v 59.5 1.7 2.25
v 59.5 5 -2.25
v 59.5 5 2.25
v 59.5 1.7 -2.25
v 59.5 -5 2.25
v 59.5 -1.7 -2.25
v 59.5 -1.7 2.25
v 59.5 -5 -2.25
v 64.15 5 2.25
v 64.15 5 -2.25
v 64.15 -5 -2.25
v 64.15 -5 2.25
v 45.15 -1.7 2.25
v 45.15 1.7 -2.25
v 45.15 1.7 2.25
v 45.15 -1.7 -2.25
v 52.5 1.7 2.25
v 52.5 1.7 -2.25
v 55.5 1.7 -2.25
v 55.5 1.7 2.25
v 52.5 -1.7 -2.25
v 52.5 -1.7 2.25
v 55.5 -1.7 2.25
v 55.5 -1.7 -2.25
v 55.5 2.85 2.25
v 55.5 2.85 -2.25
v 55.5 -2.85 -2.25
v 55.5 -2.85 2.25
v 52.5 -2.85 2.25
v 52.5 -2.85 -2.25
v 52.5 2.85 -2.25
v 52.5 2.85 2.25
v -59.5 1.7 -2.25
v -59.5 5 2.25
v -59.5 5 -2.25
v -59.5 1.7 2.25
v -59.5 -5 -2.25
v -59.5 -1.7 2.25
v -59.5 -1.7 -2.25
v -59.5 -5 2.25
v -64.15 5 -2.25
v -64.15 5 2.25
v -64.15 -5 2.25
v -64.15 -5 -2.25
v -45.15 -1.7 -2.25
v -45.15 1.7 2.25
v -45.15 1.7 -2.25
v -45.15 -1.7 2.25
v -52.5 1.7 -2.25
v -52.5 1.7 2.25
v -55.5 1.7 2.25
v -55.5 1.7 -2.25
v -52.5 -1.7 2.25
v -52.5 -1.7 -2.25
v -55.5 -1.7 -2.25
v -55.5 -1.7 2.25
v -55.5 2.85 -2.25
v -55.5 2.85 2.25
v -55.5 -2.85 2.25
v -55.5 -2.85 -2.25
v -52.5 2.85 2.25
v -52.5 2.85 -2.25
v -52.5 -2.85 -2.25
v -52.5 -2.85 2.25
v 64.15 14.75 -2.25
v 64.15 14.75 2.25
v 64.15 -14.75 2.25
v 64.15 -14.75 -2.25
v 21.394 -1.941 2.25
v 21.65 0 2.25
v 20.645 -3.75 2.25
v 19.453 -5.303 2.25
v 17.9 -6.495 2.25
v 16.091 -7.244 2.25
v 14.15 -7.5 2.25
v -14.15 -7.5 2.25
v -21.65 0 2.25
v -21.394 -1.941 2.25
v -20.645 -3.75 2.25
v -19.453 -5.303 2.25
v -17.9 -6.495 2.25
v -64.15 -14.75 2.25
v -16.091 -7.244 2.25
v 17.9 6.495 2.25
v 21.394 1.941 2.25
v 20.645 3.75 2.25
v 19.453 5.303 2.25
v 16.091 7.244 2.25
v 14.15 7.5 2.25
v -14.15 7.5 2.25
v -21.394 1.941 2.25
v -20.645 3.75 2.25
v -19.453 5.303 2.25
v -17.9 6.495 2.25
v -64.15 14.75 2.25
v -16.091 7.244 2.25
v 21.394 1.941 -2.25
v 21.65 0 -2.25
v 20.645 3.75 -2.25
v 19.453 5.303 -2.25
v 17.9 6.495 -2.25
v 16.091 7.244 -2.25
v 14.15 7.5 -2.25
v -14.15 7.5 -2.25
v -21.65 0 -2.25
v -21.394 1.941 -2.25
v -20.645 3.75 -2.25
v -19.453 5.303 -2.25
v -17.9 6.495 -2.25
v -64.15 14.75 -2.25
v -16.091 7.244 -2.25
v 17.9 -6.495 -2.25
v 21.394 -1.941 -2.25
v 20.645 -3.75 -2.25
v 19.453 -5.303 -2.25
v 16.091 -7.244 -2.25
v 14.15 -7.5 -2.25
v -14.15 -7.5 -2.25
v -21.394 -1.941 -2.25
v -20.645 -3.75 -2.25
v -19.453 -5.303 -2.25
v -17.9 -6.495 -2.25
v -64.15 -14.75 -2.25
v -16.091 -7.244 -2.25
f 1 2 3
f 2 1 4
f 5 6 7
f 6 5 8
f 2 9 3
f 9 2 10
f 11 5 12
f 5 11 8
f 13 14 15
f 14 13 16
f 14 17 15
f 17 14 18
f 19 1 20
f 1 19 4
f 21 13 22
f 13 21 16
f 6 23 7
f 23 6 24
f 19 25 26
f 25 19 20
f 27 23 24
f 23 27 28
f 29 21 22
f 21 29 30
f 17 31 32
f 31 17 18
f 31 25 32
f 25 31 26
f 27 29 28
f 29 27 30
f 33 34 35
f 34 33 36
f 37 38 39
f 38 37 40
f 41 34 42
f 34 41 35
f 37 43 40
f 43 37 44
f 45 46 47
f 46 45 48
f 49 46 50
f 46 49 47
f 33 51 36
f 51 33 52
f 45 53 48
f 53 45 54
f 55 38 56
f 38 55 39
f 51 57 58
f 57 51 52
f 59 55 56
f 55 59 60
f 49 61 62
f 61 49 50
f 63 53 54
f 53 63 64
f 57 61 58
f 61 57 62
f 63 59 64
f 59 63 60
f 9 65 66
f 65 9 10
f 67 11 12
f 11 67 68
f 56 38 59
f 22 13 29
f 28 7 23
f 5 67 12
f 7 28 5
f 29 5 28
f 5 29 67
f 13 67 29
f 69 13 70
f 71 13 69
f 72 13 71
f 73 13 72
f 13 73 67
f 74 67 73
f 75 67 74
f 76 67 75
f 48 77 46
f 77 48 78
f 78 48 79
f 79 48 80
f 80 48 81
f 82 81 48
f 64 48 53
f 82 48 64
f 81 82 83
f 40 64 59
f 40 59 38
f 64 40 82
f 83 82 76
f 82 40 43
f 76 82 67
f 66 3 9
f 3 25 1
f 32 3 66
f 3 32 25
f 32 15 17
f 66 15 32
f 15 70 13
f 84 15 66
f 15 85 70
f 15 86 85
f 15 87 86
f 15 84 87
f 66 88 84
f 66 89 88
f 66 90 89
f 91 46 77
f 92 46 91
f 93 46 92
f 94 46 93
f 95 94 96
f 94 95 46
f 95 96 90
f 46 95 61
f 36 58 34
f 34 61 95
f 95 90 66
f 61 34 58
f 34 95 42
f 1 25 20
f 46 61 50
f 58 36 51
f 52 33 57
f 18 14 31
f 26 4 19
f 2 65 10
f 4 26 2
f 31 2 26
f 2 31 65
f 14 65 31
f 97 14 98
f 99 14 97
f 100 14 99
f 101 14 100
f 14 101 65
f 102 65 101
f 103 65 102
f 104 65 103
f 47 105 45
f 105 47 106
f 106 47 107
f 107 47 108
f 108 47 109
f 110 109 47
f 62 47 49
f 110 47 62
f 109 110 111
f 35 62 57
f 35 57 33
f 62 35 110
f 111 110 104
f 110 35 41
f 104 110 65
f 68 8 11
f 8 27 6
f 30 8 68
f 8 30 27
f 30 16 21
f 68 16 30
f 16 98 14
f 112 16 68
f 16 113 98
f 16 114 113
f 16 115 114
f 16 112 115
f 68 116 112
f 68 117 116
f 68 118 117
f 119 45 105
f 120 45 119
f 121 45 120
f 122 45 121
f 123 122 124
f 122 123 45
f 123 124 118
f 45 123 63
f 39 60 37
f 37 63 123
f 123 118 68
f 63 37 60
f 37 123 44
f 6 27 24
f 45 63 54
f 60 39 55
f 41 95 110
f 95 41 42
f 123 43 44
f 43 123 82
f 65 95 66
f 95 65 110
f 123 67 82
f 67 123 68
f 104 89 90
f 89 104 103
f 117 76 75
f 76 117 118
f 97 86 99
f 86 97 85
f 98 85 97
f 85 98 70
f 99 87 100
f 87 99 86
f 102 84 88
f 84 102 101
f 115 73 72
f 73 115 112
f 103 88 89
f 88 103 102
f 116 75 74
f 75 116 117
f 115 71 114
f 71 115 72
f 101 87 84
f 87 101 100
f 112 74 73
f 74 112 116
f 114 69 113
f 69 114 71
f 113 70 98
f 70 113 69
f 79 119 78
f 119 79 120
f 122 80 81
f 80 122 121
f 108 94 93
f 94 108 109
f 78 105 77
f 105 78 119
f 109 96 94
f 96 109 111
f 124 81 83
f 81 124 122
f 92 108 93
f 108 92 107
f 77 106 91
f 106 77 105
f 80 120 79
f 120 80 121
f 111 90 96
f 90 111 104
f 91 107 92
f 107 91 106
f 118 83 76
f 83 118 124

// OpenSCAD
cw=128.3;
ch=29.5;
cd=4.5;

difference()
{
	cube([cw,ch,cd],center=true);
	captivescrew();
	mirror([1,0,0])
    captivescrew();
    
	cube([cw-100,15,cd+1],center=true);
	translate([(cw-100)/2,0,0])
		cylinder(d=15,h=cd+1,center=true);
	translate([-(cw-100)/2,0,0])
		cylinder(d=15,h=cd+1,center=true);    
}

module captivescrew()
{
	translate([cw/2-4.65,-10/2,-cd/2-0.5])
		cube([4.65+1,10,cd+1]);
	translate([cw/2-19,-3.4/2,-cd/2-0.5])
		cube([19,3.4,cd+1]);
	translate([cw/2-(3+4.65+4),-5.7/2,-cd/2-0.5])
		cube([3,5.7,cd+1]);	
}
